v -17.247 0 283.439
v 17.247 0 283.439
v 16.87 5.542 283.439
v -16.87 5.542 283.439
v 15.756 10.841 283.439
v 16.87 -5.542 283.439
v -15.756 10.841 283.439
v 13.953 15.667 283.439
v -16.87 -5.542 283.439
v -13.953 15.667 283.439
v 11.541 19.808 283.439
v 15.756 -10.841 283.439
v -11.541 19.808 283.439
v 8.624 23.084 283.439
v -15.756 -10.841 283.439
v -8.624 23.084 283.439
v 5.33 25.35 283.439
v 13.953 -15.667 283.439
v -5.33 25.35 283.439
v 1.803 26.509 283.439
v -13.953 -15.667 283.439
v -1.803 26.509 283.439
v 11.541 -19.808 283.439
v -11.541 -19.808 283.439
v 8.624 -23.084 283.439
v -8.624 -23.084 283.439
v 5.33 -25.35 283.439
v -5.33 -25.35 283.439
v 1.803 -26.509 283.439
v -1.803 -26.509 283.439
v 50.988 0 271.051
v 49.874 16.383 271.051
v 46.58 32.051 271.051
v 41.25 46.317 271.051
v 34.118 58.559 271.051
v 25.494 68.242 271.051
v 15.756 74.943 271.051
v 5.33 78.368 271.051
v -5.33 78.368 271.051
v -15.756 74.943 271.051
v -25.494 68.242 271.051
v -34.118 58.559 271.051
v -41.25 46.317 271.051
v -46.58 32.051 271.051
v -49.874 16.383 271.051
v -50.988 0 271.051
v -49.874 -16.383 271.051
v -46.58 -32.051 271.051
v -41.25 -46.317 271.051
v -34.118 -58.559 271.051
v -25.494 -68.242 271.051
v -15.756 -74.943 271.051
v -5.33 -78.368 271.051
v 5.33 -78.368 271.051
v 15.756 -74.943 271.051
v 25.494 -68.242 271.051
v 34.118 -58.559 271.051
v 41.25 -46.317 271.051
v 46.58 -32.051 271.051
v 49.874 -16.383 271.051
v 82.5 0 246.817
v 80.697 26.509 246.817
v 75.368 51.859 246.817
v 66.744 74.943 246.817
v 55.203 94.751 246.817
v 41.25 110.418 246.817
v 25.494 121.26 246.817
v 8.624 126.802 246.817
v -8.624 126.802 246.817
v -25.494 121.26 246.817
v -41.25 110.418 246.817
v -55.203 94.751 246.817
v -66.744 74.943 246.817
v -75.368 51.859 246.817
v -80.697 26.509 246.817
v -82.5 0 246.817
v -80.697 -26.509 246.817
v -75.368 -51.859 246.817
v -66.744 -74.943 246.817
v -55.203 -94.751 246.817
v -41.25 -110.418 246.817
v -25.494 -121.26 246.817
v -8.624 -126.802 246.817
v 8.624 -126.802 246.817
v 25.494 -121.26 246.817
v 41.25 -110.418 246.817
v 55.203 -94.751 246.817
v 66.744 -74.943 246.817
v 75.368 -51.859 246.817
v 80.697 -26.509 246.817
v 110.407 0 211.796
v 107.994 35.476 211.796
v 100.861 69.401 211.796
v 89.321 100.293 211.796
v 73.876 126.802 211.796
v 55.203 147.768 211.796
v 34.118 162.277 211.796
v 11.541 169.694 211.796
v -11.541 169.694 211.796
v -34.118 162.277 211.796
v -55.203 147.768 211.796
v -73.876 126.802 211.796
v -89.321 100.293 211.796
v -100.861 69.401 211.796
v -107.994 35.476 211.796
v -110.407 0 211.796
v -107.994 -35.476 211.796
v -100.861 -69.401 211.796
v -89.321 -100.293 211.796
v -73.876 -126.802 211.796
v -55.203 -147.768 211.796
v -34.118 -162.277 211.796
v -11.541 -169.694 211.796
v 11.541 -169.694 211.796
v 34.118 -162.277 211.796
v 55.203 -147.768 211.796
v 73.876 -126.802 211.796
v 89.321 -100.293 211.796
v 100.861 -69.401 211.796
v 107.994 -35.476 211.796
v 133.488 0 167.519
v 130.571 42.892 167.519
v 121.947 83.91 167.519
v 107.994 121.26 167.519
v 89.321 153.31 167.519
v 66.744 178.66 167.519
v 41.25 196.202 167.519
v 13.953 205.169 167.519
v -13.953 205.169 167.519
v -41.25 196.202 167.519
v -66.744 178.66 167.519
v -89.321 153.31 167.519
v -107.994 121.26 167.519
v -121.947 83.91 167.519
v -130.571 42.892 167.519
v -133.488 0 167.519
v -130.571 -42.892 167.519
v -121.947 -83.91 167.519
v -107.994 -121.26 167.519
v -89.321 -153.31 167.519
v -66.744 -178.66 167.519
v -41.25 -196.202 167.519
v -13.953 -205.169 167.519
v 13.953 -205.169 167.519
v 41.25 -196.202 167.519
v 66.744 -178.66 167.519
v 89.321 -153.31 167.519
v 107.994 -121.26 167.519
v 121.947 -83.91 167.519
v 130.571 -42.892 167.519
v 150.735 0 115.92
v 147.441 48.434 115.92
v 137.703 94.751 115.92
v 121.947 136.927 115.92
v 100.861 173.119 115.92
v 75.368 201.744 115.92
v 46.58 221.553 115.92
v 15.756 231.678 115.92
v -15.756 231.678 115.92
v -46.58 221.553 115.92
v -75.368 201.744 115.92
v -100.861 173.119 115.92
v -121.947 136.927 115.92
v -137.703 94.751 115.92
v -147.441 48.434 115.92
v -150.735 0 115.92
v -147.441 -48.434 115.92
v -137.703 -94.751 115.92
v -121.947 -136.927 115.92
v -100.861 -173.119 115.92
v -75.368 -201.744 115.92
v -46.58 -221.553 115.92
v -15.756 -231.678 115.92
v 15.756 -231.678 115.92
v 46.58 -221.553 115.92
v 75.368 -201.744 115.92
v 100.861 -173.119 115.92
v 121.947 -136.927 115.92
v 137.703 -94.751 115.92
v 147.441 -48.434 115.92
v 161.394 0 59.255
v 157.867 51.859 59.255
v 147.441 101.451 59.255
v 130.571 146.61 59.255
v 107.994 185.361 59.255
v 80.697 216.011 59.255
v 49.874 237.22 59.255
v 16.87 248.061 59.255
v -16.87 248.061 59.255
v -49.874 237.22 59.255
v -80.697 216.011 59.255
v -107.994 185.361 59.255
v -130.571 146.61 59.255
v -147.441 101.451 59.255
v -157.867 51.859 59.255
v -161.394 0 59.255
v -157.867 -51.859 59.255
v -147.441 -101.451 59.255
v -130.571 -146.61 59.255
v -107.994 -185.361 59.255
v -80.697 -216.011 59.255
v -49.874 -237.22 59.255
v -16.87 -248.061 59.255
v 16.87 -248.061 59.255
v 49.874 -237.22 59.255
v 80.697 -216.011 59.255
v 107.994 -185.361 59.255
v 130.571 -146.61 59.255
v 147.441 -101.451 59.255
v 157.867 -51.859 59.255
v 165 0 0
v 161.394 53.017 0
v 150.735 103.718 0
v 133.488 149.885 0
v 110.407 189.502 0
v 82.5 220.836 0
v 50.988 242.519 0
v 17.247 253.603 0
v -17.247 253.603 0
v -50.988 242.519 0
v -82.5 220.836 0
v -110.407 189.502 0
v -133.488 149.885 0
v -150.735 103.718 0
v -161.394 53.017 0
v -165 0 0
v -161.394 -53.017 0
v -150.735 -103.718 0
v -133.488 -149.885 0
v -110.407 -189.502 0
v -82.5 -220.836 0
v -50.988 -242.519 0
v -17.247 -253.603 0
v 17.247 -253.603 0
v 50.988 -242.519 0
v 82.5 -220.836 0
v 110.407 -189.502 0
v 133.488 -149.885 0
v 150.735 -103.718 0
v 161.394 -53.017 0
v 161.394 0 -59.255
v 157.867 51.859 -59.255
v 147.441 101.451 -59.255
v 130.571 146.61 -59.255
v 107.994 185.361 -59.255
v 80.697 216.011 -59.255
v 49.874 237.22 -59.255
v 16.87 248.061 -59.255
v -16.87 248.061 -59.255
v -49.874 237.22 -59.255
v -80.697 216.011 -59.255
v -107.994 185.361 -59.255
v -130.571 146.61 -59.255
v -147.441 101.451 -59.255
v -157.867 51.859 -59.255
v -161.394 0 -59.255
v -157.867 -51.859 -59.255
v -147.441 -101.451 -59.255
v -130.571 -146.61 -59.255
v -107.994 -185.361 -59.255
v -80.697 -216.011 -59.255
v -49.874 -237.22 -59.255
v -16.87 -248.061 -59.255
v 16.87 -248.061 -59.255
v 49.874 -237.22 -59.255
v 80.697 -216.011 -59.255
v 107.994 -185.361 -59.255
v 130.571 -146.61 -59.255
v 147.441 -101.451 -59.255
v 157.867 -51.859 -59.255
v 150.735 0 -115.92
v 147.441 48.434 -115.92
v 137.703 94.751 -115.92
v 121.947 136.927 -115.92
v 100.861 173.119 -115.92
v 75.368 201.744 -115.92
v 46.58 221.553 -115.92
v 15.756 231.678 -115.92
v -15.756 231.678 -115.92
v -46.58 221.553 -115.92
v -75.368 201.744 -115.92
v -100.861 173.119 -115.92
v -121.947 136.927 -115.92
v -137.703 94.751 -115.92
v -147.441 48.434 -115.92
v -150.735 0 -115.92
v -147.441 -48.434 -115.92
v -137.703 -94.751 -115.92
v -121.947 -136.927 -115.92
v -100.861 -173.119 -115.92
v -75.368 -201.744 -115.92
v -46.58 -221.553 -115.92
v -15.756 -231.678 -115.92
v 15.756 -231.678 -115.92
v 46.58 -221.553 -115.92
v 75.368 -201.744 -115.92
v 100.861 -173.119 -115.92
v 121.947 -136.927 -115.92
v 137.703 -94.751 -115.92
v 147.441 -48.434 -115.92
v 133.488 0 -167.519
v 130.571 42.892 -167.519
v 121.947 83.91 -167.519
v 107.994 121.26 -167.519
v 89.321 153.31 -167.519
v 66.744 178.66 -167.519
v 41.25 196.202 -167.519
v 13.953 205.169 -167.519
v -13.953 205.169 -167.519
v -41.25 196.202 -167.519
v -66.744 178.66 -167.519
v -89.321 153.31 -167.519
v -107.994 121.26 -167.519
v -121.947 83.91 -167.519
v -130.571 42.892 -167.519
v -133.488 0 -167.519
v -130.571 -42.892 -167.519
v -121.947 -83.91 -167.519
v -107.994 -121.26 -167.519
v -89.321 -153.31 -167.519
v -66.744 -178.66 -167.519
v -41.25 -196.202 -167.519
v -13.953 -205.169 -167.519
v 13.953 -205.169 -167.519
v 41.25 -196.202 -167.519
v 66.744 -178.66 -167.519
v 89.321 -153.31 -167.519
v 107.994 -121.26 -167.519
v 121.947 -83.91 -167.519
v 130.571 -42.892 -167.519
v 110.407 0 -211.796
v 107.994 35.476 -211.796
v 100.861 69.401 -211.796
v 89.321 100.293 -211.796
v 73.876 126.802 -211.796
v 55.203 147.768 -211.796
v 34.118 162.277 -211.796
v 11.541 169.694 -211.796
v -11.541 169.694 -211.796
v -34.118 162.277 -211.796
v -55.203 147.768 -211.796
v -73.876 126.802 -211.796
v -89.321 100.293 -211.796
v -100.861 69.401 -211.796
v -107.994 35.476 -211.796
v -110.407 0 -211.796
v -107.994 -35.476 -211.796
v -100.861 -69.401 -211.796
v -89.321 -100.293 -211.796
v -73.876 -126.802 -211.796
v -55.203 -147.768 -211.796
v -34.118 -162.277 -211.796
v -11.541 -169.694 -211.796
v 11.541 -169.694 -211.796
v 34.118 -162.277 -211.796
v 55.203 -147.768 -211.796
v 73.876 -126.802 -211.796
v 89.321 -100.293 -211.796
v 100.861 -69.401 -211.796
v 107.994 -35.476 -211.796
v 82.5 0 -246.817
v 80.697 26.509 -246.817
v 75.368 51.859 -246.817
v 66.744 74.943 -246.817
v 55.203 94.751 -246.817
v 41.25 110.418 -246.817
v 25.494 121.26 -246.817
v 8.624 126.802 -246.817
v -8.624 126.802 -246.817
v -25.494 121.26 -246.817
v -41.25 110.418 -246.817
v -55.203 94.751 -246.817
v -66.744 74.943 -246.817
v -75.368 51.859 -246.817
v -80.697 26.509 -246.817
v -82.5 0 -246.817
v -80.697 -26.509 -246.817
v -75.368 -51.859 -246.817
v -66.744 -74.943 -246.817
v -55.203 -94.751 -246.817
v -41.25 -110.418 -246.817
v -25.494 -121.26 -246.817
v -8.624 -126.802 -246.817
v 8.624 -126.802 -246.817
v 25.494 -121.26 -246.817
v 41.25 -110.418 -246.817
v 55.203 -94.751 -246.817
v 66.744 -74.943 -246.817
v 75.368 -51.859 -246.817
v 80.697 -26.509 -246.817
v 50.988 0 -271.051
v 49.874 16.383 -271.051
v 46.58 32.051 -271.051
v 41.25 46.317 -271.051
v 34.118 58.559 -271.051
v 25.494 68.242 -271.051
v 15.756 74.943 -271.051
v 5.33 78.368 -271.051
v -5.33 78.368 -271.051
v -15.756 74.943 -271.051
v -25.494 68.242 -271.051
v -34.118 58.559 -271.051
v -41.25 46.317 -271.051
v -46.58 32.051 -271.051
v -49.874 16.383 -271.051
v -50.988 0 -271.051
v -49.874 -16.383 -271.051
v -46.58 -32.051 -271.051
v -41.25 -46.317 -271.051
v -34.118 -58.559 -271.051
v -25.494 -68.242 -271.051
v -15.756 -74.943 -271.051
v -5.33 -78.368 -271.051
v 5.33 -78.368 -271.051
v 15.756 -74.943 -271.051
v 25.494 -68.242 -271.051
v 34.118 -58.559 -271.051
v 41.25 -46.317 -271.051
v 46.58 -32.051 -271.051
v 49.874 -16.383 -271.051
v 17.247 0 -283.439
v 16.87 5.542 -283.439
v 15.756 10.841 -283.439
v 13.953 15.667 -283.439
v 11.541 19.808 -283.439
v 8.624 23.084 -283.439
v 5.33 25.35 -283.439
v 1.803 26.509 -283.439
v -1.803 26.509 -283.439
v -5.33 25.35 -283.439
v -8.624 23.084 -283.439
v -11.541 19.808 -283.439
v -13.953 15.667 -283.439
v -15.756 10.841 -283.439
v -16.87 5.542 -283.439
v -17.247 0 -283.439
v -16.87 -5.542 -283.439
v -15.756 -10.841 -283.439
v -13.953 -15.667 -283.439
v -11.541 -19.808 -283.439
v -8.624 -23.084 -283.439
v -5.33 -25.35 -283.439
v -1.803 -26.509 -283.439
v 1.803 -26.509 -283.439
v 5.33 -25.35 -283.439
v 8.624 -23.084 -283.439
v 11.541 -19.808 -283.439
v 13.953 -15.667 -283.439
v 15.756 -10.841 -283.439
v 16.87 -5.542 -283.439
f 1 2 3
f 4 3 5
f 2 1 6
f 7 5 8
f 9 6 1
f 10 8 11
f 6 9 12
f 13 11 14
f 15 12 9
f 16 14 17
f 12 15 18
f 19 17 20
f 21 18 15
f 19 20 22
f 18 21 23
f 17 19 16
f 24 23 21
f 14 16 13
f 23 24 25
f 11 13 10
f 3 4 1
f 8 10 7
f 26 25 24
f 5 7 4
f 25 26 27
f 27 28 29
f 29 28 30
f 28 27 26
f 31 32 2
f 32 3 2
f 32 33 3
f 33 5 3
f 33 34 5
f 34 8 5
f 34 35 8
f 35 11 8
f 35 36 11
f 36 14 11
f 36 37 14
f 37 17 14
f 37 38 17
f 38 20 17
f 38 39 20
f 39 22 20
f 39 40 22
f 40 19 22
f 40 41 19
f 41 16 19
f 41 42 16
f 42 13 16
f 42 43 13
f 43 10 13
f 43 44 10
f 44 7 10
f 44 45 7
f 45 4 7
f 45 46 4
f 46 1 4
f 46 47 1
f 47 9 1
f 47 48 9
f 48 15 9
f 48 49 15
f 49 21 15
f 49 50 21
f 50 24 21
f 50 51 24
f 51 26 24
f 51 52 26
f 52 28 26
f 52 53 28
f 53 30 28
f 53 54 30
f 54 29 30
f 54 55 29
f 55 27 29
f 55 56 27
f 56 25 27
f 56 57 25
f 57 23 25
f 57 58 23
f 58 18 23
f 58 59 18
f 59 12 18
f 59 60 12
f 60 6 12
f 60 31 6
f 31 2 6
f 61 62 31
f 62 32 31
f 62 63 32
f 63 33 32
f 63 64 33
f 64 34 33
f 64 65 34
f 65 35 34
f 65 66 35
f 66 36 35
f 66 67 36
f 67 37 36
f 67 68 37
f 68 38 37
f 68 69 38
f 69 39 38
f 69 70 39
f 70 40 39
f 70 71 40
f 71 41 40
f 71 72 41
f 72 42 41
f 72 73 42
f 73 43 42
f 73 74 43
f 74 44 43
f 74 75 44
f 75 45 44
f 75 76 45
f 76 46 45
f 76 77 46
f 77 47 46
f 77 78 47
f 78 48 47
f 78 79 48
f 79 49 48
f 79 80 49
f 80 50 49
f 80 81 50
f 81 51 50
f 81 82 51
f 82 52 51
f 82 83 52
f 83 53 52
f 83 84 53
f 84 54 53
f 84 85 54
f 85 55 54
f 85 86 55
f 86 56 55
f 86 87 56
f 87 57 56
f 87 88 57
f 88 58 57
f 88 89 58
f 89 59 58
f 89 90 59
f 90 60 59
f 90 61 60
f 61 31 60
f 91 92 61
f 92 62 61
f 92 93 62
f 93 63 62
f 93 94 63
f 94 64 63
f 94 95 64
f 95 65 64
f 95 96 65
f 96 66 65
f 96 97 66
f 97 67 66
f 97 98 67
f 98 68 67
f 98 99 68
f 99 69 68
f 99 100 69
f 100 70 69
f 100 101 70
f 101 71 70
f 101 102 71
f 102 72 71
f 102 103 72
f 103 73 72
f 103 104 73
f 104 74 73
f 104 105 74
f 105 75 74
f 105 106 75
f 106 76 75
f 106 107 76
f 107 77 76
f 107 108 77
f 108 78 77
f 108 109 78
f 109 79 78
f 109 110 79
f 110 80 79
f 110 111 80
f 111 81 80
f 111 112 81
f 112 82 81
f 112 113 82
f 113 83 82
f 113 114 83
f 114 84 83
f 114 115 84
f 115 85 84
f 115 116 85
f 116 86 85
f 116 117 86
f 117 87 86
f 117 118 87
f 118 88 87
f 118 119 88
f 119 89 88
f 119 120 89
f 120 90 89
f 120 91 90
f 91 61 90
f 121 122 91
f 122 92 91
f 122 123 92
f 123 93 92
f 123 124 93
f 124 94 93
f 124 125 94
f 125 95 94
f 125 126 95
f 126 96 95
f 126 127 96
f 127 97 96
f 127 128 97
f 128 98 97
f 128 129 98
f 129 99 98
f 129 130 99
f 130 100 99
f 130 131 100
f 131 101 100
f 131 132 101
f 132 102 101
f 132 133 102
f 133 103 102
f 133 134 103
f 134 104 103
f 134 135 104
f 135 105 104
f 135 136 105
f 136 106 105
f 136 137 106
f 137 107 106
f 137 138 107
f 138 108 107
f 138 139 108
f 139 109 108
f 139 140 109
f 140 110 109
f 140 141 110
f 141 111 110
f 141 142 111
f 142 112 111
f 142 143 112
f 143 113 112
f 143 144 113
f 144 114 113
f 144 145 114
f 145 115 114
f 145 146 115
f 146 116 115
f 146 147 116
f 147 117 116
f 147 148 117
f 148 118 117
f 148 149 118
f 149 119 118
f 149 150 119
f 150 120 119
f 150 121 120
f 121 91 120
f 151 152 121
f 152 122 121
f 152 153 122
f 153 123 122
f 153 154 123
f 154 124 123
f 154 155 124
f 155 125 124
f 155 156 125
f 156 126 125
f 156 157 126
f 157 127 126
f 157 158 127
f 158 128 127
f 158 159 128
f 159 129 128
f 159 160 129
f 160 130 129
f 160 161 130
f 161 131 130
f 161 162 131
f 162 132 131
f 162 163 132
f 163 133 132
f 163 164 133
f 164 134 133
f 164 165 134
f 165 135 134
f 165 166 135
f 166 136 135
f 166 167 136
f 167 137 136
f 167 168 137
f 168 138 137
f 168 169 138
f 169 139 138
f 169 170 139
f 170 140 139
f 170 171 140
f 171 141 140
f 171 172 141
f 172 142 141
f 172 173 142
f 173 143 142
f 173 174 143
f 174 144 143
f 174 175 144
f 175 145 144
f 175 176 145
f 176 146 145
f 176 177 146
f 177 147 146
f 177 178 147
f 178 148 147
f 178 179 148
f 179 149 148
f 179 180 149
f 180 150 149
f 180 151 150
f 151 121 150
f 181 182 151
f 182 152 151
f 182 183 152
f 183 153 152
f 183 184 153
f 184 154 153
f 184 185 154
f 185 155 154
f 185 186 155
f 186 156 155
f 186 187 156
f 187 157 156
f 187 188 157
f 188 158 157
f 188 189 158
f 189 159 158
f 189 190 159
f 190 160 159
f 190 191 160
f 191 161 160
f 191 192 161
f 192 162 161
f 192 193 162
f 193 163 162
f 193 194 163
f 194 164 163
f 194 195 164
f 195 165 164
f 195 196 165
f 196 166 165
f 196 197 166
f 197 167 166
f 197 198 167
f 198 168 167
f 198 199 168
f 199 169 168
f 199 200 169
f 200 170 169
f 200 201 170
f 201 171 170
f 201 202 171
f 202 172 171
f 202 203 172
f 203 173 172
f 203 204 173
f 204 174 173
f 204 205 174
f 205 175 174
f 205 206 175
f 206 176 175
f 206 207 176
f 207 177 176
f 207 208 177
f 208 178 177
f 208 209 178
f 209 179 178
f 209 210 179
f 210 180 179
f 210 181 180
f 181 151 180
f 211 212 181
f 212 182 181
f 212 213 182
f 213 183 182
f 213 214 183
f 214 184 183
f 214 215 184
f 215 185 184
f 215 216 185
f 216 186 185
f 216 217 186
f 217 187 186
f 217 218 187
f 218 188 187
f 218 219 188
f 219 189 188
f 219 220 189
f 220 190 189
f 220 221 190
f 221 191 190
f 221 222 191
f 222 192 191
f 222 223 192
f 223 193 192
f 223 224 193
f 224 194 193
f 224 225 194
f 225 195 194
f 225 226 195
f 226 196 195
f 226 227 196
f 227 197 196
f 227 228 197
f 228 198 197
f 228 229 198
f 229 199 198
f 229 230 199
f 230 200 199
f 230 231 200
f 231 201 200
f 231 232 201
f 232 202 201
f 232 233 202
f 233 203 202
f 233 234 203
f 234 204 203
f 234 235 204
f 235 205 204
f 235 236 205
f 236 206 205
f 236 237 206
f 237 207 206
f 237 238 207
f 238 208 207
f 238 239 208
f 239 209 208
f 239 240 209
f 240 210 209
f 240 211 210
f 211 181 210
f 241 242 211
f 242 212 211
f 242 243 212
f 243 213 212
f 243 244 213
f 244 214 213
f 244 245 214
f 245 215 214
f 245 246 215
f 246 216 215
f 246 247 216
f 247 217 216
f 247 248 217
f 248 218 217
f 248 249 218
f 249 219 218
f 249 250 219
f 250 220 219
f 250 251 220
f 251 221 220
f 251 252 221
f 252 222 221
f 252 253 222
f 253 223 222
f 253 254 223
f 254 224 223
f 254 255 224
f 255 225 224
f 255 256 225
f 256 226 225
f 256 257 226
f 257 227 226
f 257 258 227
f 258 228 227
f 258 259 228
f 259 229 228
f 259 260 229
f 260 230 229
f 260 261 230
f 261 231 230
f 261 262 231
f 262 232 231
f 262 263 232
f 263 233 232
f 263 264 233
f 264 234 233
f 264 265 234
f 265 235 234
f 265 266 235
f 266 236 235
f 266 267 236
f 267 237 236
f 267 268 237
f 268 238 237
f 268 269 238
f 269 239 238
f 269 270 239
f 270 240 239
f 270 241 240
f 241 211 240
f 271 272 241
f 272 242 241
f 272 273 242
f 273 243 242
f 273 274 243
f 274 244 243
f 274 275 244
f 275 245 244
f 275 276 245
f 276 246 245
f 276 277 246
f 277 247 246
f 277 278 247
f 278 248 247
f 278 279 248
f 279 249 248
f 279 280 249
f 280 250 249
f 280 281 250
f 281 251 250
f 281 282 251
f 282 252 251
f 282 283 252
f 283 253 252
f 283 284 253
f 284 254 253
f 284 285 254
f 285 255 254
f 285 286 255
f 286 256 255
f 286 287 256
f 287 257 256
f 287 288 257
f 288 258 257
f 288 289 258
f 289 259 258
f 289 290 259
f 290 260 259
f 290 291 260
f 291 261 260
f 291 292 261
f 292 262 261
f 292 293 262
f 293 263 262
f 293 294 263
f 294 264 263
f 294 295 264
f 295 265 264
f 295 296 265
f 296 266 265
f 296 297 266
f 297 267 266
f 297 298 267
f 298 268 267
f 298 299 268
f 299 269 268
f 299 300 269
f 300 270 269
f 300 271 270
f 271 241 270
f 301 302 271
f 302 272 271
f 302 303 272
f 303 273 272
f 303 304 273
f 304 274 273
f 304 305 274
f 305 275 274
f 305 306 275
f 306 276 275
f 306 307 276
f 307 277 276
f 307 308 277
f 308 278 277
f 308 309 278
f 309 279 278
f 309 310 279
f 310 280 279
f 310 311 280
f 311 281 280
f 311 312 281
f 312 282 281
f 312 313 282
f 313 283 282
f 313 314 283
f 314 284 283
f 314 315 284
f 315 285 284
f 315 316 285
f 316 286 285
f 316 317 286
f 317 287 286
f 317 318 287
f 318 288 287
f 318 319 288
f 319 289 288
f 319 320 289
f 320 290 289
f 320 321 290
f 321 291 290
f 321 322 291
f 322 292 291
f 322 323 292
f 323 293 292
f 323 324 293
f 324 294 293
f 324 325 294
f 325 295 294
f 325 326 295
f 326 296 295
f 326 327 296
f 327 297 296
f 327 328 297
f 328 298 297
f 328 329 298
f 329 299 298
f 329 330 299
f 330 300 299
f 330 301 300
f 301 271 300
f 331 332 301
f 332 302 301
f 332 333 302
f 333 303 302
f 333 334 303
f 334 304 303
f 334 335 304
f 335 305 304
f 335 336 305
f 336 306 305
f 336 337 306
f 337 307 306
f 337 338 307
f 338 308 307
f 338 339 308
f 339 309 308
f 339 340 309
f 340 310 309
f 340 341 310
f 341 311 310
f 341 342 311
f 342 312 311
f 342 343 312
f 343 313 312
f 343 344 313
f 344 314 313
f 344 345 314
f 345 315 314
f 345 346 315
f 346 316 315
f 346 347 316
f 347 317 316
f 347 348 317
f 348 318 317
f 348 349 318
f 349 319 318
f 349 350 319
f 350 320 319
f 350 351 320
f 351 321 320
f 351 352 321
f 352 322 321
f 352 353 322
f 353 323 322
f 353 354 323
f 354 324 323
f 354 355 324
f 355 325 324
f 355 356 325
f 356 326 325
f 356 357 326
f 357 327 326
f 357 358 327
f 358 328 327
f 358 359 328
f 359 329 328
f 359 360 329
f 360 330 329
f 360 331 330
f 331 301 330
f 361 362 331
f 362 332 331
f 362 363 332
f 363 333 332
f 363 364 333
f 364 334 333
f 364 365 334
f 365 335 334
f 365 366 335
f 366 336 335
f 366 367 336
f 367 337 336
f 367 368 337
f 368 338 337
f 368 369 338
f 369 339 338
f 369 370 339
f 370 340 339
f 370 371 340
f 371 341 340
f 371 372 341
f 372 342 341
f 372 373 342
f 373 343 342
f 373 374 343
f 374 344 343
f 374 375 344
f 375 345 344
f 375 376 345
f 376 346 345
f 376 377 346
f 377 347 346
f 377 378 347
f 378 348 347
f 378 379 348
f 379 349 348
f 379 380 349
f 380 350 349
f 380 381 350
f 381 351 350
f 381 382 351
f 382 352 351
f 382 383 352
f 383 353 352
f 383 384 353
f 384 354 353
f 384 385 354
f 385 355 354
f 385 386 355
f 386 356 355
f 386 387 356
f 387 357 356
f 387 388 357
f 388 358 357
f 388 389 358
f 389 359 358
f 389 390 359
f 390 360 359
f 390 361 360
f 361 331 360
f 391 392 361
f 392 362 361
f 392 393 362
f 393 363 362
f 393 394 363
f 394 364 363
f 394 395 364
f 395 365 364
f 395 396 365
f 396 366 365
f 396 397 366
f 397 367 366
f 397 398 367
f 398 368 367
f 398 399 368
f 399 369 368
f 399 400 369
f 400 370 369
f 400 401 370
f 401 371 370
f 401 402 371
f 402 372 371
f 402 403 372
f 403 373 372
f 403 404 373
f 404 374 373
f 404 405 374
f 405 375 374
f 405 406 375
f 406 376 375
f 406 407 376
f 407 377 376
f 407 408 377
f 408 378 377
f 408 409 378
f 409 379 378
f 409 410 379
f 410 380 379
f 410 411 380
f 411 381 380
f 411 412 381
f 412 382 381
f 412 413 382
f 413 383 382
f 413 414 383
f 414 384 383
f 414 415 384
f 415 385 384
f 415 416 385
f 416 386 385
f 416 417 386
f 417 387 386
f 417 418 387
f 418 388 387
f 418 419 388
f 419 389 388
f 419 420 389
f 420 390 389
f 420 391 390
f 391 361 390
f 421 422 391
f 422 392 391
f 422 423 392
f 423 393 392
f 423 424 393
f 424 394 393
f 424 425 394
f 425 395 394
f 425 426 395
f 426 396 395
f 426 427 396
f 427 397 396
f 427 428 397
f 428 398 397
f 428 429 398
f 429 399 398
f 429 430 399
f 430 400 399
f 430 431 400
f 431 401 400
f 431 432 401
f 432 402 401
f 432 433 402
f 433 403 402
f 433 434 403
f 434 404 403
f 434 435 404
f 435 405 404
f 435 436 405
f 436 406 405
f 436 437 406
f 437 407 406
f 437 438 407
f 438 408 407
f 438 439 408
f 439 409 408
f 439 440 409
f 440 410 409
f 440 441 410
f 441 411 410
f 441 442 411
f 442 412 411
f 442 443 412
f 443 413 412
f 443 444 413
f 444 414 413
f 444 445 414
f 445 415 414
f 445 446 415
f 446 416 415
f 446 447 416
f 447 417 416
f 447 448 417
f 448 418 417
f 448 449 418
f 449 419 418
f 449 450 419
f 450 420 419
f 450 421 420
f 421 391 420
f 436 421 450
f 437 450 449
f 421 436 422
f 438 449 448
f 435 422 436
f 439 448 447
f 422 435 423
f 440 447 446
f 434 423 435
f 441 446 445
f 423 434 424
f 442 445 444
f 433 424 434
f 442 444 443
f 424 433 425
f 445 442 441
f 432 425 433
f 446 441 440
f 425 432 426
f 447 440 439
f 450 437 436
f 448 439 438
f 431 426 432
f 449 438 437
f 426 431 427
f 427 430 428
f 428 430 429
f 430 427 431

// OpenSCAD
// Generated by SolidPython 1.0.1 on 2020-07-29 00:46:50


scale(v = [11, 17, 19]) {
	sphere(r = 15);
}
/***********************************************
*********      SolidPython code:      **********
************************************************
 
# import packages: SolidPython
from solid import *
from solid.utils import *
from itertools import chain, combinations, permutations


class Resize:

    def __init__(self, scad_file):
        self.scad_file = scad_file
        #self.scad_file = import_scad(scad_file)
        # cone/cylinder param:
        self.r1 = 0
        self.r2 = 0
        self.h = 0
        # rectangular prism param:
        self.w = 0
        self.l = 0
        # ellipse param:
        self.r = 0

    # import OpenScad code (file name corresponds to shape)


    # classify shape + parameters
    def assign(self, param1, param2, param3):
        if self.scad_file == 'cone.scad':
            self.r1 = param1
            self.r2 = param2
            self.h = param3
        elif self.scad_file == 'cylinder.scad':
            self.r1 = param1
            self.r2 = param2
            self.h = param3
        elif self.scad_file == 'rectangularPrism.scad':
            self.h = param1
            self.l = param2
            self.w = param3
        else:
            self.r = param1
            self.h = param2

    # resize parameters
    def iterate(self):
        x = range(3, 20, 2)
        i = 1
        if self.scad_file == 'cone.scad':
            tempList = list(permutations(x, 2))
            for temp in tempList:
                param1 = temp[0]
                param2 = temp[1]
                filepath = 'produced_scad_files/' + 'cone' + str(param1) + '_' + str(param2) + '_' + '.scad'
                scad_render_to_file(cylinder(h=param1, r1=param2, r2=0), filepath)

        elif self.scad_file == 'cylinder.scad':
            tempList = list(permutations(x, 3))
            for temp in tempList:
                param1 = temp[0]
                param2 = temp[1]
                filepath = 'produced_scad_files/' + 'cylinder' + str(param1) + '_' + str(param2) + '_' + '.scad'
                scad_render_to_file(cylinder(h=param1, r1=param2, r2=param2), filepath)

        elif self.scad_file == 'rectangularPrism.scad':
            tempList = list(permutations(x, 3))
            for temp in tempList:
                param1 = temp[0]
                param2 = temp[1]
                param3 = temp[2]
                filepath = 'produced_scad_files/' + 'rectangularPrism' + str(param1) + '_' + str(param2) + '_' + str(
                    param3) + '.scad'
                scad_render_to_file(cube(size=(param1, param2, param3)), filepath)

        elif self.scad_file == 'ellipse.scad':
            tempList = list(permutations(x, 4))
            for temp in tempList:
                param1 = temp[0]
                param2 = temp[1]
                param3 = temp[2]
                param4 = temp[3]
                filepath = 'produced_scad_files/' + 'ellipse' + str(param1) + '_' + str(param2) + '_' + str(param3) + '_' + str(param4) + '.scad'
                scad_render_to_file(scale([param1, param2, param3])(sphere(r=param4)), filepath)

    def render_to_scadfile(self):
        scad_render_to_file(scad, 'example.scad') 
 
************************************************/
